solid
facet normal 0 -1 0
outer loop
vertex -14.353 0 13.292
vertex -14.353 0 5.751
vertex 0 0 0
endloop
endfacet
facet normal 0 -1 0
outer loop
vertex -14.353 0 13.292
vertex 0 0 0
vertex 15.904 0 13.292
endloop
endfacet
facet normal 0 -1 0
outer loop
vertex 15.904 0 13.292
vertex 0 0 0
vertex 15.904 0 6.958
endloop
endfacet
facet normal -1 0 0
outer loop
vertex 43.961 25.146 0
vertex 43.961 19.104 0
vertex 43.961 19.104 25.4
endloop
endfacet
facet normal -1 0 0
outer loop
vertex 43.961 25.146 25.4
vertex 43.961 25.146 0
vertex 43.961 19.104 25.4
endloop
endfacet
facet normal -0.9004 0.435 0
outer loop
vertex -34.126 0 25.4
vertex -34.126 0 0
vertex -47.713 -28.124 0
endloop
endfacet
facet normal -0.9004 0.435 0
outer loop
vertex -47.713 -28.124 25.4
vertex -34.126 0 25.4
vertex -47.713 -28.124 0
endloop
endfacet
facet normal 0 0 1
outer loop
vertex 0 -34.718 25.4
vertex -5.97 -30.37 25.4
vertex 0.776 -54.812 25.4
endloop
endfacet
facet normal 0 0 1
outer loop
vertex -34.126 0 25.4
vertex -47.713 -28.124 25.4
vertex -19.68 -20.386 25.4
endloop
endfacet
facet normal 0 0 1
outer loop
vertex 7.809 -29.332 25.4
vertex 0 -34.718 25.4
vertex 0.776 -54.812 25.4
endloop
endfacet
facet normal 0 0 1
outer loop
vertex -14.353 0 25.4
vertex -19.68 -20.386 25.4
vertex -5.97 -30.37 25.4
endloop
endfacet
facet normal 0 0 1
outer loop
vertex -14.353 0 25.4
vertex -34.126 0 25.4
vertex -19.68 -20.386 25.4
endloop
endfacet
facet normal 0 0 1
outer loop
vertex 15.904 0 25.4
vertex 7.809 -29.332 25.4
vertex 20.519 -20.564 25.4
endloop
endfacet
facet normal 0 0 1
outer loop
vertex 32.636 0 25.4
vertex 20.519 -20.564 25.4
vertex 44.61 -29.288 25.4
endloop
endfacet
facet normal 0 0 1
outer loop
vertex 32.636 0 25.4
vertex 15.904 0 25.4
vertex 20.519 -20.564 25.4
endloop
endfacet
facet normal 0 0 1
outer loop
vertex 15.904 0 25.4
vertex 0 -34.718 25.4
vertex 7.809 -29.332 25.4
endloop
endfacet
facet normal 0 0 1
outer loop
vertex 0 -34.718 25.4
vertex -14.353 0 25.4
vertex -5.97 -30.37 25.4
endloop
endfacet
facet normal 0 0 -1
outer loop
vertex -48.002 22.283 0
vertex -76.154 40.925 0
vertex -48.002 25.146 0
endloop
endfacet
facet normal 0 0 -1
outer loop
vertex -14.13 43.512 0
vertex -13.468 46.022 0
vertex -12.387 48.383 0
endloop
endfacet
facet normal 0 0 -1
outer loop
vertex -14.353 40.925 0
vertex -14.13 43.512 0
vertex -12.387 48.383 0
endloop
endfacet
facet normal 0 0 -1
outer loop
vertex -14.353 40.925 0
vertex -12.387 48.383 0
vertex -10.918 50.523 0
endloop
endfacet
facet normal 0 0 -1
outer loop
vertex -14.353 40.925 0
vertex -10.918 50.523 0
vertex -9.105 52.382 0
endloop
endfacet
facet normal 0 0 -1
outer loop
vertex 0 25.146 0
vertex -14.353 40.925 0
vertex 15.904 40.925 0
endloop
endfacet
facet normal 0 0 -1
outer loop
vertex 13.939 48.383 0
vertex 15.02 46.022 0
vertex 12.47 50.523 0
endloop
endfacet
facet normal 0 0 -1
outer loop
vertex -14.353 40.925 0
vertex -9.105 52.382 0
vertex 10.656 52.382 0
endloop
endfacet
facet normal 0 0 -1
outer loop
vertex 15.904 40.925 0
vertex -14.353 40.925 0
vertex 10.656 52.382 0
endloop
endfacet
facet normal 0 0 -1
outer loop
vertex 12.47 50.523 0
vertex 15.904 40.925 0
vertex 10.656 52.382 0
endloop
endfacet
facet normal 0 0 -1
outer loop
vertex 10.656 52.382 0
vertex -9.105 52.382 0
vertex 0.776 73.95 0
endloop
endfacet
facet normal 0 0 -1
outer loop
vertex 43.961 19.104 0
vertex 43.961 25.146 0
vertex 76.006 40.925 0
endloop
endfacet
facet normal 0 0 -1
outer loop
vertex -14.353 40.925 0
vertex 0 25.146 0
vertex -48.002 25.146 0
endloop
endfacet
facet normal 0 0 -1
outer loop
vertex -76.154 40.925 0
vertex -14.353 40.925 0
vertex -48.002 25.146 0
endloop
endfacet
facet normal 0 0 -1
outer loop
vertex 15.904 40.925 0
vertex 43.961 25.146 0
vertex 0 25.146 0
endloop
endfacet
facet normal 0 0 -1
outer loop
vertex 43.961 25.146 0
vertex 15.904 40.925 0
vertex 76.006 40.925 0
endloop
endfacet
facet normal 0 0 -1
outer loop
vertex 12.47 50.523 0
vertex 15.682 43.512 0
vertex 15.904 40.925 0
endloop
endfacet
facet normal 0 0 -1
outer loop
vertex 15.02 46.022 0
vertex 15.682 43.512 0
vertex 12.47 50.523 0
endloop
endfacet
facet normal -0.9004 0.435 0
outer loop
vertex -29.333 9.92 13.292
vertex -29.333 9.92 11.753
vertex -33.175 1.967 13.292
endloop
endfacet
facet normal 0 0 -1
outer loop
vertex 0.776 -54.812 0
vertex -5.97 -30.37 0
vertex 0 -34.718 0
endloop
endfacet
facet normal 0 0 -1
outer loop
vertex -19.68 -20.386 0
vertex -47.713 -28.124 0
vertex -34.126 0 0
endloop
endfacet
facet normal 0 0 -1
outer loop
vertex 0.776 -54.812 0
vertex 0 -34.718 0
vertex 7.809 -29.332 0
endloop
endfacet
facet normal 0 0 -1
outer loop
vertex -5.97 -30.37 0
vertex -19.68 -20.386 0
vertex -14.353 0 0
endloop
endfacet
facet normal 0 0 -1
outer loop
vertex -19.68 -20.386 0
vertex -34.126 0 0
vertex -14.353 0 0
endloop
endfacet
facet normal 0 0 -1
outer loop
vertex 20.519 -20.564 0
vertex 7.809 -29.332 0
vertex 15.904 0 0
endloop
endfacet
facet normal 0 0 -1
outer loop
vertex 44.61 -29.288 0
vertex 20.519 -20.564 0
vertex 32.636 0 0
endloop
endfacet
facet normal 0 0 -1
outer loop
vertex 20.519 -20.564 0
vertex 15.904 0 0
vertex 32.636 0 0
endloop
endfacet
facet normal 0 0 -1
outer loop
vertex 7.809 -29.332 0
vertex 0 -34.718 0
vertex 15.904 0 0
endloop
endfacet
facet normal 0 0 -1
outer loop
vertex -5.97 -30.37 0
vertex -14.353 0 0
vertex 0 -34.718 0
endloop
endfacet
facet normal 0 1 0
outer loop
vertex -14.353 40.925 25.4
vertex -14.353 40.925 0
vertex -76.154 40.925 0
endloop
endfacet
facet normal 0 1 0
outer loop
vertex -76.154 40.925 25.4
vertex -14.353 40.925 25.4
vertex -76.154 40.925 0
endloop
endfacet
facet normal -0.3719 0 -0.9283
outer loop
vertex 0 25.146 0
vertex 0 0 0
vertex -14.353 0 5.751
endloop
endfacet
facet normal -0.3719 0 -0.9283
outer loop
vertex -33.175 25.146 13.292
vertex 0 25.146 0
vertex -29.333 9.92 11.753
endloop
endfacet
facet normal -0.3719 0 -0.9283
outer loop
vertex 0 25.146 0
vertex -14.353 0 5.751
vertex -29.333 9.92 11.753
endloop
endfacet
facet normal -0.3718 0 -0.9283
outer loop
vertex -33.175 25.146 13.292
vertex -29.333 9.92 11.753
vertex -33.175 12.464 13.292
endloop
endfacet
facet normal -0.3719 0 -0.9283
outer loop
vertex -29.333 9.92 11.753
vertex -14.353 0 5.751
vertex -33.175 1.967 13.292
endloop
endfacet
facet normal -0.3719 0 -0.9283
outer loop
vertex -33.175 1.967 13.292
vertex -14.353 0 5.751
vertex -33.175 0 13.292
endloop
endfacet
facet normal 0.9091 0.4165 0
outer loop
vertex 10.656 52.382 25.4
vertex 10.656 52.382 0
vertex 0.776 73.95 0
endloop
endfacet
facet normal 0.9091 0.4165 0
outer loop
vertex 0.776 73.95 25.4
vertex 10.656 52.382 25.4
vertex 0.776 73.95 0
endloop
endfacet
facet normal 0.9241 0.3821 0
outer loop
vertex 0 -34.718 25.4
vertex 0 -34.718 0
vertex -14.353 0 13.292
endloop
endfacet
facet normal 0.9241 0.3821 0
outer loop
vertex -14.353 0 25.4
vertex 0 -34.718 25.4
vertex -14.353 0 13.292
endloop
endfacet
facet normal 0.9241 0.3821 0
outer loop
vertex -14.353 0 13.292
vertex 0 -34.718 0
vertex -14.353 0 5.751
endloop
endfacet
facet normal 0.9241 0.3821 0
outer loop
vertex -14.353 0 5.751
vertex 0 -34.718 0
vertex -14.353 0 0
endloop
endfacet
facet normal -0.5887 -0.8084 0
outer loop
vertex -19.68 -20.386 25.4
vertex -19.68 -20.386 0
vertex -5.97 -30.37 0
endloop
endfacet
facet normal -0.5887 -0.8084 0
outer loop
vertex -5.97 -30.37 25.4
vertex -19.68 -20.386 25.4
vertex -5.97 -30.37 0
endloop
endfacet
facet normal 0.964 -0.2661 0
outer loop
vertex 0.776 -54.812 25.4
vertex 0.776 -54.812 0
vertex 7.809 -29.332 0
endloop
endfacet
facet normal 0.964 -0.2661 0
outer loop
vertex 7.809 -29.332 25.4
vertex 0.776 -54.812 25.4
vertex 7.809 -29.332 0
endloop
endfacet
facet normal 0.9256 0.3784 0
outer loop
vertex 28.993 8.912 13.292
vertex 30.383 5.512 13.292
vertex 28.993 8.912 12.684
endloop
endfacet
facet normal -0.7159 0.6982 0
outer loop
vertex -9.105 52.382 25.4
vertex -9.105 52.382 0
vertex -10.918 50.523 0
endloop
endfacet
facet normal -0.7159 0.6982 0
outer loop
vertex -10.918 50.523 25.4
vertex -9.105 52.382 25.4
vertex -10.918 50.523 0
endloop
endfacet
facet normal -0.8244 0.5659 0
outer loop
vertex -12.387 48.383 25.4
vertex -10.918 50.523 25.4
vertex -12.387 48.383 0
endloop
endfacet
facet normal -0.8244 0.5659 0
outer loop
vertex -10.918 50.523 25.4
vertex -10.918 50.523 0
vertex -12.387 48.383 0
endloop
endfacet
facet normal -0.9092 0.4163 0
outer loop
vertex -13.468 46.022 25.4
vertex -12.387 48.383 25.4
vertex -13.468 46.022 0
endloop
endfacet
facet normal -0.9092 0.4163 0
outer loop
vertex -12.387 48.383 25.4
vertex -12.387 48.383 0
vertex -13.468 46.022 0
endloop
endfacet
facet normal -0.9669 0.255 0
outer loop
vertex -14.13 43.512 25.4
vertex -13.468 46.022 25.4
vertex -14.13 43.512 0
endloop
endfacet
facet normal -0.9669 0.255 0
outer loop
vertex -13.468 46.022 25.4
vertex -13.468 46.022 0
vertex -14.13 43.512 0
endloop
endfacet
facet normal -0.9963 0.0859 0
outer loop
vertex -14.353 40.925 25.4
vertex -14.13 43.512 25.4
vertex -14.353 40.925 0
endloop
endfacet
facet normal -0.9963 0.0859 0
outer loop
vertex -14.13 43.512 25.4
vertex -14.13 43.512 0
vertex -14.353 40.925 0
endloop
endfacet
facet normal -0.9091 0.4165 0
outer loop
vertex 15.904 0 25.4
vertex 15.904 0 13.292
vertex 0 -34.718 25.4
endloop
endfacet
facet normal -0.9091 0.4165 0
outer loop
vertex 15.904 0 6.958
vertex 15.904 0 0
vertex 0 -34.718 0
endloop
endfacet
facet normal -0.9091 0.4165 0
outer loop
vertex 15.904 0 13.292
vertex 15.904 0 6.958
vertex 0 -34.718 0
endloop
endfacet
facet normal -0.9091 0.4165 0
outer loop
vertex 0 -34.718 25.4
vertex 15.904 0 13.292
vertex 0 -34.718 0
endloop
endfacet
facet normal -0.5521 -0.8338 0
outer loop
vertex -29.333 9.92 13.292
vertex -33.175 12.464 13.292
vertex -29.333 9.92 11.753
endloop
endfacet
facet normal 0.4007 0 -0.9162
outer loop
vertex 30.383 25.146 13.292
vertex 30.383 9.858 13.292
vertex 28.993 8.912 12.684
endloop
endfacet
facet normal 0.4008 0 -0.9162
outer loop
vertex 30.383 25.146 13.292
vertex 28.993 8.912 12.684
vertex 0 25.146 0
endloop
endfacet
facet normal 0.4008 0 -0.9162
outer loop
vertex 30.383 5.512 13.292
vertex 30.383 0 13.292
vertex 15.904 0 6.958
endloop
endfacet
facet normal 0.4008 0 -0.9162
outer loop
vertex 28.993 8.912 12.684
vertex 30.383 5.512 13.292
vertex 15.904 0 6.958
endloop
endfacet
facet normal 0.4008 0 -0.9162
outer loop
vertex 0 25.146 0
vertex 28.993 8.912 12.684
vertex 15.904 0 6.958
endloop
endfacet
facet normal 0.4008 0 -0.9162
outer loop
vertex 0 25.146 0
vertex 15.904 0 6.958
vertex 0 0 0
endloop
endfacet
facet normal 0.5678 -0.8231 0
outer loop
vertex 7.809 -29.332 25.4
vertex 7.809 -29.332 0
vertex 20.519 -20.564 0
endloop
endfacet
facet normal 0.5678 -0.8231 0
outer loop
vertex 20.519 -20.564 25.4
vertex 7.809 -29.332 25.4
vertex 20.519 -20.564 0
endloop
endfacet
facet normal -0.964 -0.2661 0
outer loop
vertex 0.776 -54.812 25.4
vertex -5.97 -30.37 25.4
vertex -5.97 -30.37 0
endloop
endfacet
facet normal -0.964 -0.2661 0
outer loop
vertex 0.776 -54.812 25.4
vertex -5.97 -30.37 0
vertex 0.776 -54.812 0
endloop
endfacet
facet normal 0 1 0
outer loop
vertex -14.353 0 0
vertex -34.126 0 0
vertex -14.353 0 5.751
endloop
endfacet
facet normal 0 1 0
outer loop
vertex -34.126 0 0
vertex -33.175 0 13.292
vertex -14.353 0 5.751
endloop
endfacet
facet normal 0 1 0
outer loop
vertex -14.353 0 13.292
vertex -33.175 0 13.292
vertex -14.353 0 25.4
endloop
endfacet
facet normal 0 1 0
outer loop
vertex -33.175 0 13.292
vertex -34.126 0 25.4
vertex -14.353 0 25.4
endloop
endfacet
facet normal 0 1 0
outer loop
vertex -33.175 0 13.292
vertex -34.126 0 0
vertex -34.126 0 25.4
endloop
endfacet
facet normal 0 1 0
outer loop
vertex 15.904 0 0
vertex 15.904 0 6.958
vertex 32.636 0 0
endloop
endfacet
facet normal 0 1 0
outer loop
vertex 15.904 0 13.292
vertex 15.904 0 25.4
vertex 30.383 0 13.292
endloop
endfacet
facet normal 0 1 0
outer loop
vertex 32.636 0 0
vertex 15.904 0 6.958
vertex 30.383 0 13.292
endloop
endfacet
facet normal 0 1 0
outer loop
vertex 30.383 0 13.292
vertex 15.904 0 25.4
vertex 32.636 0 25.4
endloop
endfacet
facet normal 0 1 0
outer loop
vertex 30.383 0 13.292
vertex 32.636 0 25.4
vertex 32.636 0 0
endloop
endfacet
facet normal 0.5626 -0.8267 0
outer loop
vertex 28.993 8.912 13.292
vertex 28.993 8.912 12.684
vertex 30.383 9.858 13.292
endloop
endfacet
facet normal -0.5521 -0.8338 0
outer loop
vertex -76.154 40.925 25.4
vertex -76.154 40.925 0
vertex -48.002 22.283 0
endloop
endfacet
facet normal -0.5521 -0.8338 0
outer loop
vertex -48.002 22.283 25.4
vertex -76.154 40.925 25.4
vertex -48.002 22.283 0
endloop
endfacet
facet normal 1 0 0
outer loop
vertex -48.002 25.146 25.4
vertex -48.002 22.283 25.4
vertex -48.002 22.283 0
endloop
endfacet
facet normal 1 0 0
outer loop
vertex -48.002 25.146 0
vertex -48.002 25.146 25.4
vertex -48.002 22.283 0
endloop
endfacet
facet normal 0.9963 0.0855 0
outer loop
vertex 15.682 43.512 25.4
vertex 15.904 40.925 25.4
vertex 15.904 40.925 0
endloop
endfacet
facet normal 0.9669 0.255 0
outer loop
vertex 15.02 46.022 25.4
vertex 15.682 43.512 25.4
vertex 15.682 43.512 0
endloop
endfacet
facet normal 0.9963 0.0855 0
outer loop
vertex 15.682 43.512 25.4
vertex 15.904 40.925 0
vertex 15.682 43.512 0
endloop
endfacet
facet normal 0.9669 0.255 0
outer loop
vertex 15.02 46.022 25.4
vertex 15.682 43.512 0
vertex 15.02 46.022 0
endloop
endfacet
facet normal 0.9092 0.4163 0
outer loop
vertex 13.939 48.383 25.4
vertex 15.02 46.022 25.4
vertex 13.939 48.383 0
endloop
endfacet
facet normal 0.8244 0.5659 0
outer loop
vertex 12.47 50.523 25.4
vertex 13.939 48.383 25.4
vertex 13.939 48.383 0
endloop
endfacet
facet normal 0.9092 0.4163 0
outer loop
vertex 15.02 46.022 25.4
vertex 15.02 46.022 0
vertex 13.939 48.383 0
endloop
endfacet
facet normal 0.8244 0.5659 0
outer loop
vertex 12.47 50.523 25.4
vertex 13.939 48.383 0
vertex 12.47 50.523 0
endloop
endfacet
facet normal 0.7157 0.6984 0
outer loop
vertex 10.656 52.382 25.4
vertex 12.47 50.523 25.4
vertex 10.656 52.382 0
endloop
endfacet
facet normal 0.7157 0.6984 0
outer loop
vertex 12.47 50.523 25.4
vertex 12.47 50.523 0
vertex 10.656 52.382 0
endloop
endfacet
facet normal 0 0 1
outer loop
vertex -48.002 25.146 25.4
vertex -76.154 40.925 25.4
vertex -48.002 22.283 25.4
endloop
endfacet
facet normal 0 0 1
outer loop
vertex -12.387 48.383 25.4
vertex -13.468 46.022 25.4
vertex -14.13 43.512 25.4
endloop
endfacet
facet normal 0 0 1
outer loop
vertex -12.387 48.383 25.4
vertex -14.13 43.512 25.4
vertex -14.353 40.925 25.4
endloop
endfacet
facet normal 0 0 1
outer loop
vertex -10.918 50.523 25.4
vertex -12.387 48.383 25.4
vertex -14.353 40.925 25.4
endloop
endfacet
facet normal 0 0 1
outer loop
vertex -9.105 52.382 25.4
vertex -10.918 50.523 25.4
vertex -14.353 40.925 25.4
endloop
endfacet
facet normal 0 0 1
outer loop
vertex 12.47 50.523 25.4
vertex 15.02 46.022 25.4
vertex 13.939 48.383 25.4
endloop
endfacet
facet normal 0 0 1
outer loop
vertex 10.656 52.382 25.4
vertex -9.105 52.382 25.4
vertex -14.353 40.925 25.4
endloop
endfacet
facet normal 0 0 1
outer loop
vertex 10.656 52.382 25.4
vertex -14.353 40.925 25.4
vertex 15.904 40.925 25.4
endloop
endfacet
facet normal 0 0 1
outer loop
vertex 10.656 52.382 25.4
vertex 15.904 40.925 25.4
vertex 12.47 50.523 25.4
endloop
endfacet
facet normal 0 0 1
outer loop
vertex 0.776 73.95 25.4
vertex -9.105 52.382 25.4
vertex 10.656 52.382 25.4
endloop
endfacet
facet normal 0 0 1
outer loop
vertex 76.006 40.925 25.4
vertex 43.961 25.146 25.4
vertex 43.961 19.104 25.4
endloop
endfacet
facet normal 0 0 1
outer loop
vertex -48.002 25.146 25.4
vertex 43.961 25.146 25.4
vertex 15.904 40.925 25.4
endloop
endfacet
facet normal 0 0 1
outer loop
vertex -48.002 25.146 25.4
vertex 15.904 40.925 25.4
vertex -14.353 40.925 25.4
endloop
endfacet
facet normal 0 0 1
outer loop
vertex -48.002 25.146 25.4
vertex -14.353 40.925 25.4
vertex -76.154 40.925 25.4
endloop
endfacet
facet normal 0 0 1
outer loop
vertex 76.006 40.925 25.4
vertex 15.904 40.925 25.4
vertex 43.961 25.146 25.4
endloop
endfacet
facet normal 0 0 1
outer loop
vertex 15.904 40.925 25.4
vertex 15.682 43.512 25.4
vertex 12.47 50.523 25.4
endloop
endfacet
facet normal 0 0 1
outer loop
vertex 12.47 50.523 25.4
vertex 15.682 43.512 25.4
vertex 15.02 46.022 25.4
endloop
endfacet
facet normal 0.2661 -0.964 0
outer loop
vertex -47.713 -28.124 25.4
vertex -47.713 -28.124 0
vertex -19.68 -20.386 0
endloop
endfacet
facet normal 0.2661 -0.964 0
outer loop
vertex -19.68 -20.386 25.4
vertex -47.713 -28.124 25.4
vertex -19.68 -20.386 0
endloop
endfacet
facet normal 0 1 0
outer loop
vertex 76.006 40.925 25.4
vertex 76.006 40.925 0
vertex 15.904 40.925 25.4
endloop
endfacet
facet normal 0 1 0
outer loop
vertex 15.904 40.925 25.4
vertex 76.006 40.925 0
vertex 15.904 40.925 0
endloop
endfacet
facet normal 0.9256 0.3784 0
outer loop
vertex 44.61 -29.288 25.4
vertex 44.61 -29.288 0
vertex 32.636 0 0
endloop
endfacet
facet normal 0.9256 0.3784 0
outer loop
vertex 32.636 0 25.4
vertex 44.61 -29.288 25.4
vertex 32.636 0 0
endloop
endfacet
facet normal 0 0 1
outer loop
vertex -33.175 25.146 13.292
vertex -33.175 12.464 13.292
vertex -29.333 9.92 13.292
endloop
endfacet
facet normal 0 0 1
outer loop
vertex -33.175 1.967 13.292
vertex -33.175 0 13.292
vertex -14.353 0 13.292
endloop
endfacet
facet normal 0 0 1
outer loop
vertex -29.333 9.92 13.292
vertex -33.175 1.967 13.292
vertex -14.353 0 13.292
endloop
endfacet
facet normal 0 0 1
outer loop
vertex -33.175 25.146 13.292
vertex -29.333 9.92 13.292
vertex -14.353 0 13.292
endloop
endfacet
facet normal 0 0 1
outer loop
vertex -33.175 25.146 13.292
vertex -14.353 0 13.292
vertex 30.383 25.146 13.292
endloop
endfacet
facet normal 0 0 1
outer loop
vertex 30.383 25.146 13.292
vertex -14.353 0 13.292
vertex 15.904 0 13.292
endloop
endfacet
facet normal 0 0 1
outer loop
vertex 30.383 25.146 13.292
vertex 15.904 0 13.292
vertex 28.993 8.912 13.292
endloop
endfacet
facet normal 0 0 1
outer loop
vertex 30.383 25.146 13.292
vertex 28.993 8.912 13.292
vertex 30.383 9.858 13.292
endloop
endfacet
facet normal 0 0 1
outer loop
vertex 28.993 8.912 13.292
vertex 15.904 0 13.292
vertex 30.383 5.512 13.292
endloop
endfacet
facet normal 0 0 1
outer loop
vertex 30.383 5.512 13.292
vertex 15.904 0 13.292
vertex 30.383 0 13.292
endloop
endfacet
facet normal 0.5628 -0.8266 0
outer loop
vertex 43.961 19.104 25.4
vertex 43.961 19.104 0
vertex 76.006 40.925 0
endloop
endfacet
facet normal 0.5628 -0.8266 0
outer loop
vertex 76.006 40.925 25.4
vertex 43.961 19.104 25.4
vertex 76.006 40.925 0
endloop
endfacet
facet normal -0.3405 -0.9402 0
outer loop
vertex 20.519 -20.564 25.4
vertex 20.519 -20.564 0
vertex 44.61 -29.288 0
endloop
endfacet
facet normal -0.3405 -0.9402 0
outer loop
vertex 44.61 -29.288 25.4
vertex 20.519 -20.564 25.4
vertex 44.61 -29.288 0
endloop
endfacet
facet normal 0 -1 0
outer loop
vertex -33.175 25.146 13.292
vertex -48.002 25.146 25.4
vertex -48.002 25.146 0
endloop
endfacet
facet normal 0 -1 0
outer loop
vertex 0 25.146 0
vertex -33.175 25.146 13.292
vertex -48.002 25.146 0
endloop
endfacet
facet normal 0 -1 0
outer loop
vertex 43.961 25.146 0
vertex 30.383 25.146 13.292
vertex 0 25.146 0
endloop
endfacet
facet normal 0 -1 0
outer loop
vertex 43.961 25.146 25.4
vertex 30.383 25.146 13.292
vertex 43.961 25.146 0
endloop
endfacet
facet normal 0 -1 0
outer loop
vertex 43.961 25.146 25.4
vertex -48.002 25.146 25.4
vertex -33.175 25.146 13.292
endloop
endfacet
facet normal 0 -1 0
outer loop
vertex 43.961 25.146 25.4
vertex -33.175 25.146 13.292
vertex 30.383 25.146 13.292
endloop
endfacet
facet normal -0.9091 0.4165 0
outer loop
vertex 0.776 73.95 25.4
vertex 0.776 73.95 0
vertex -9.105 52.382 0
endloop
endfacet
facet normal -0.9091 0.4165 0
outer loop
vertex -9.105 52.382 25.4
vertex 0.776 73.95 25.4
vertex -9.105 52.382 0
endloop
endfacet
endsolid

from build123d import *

# Parameters (mm, degrees)
F0_W     = 14.3528226763
F0_H     = 40.9249328077
F0_W_2   = 15.9044768661
F1_DEPTH = 25.4
F3_DEPTH = 36.322
F5_DEPTH = 25.146


with BuildPart() as f1:
    # F0 (on Top) → F1 (new body)
    with BuildSketch(Plane.XY):
        with Locations((-7.1764113382, 20.4624664038)):
            Rectangle(F0_W, F0_H)
        with Locations((7.9522384331, 20.4624664038)):
            Rectangle(F0_W_2, F0_H)
        Polygon((-29.3328283983, 9.9198052494), (-14.3528226763, 0), (-14.3528226763, 40.9249328077), align=None)
        Polygon((-5.9702647759, -30.3703169913), (-14.3528226763, 0), (-47.713432461, -28.1237699091), (-19.6796488017, -20.3861221671), align=None)
        Polygon((-47.713432461, -28.1237699091), (-14.3528226763, 0), (-29.3328283983, 9.9198052494), align=None)
        Polygon((0, -34.7183085978), (-14.3528226763, 0), (-5.9702647759, -30.3703169913), align=None)
        with BuildLine():
            Line((-14.3528226763, 40.9249328077), (0, 40.9249328077))
            Line((0, 40.9249328077), (15.9044768661, 40.9249328077))
            Line((15.9044768661, 40.9249328077), (10.6561835989, 52.3815727712))
            ThreePointArc((10.6561835989, 52.3815727712), (0.7758270949, 56.0535825789), (-9.1045294091, 52.3815727712))
            Line((-9.1045294091, 52.3815727712), (-14.3528226763, 40.9249328077))
        make_face()
        Polygon((28.9926118268, 8.9120575126), (15.9044768661, 0), (44.6101129055, -29.2875114828), align=None)
        Polygon((7.8085155122, -29.3319671142), (15.9044768661, 0), (0, -34.7183085978), align=None)
        Polygon((15.9044768661, 40.9249328077), (15.9044768661, 0), (28.9926118268, 8.9120575126), align=None)
        Polygon((44.6101129055, -29.2875114828), (15.9044768661, 0), (7.8085155122, -29.3319671142), (20.5186381936, -20.5644797534), align=None)
        Polygon((-29.3328283983, 9.9198052494), (-14.3528226763, 40.9249328077), (-76.1540085077, 40.9249328077), align=None)
        with BuildLine():
            ThreePointArc((-9.1045294091, 52.3815727712), (-12.9783085934, 47.2257101699), (-14.3528226763, 40.9249328077))
            Line((-14.3528226763, 40.9249328077), (-9.1045294091, 52.3815727712))
        make_face()
        Polygon((7.8085155122, -29.3319671142), (0, -34.7183085978), (-5.9702647759, -30.3703169913), (0.7758270949, -54.8116570932), align=None)
        Polygon((76.0063156486, 40.9249328077), (15.9044768661, 40.9249328077), (28.9926118268, 8.9120575126), align=None)
        with BuildLine():
            Line((10.6561835989, 52.3815727712), (15.9044768661, 40.9249328077))
            ThreePointArc((15.9044768661, 40.9249328077), (14.5299627832, 47.2257101699), (10.6561835989, 52.3815727712))
        make_face()
        with BuildLine():
            Line((0.7758270949, 73.9496676573), (-9.1045294091, 52.3815727712))
            ThreePointArc((-9.1045294091, 52.3815727712), (0.7758270949, 56.0535825789), (10.6561835989, 52.3815727712))
            Line((10.6561835989, 52.3815727712), (0.7758270949, 73.9496676573))
        make_face()
    extrude(amount=F1_DEPTH)

    # F2 (on Top) → F3 (cut)
    with BuildSketch(Plane.XY):
        Polygon((0, 17.6911037415), (0, 0), (26.803391082, 17.6601352598), align=None)
        Polygon((-27.6542542717, 17.7230553056), (0, 0), (0, 17.6911037415), align=None)
        Polygon((-44.7053313255, 28.6507476121), (-27.6542542717, 17.7230553056), (0, 17.6911037415), align=None)
        Polygon((0, 17.6911037415), (26.803391082, 17.6601352598), (43.3298423886, 28.5490322858), align=None)
        Polygon((-44.7053313255, 28.6507476121), (0, 17.6911037415), (43.3298423886, 28.5490322858), align=None)
    extrude(amount=-F3_DEPTH, mode=Mode.SUBTRACT)

    # F4 (on Front) → F5 (cut)
    with BuildSketch(Plane.XZ):
        with BuildLine():
            Line((43.9610369503, 0), (0, 0))
            Line((0, 0), (-48.0021461844, 0))
            ThreePointArc((-48.0021461844, 0), (-2.020554617, -23.4103047443), (43.9610369503, 0))
        make_face()
        Polygon((30.382517891, 13.2921541349), (0, 0), (43.9610369503, 0), (43.9610369503, 19.2326679826), align=None)
        Polygon((-48.0021461844, 0), (0, 0), (-33.1754245675, 13.2921541349), (-48.0021461844, 19.2326679826), align=None)
        Polygon((-48.0021461844, 19.2326679826), (-33.1754245675, 13.2921541349), (0, 13.2921541349), (0, 36.8990898132), align=None)
        Polygon((0, 13.2921541349), (30.382517891, 13.2921541349), (43.9610369503, 19.2326679826), (0, 36.8990898132), align=None)
        Polygon((-48.0021461844, 56.3966855407), (-48.0021461844, 19.2326679826), (0, 36.8990898132), (43.9610369503, 19.2326679826), (43.9610369503, 56.5599761903), (0, 56.3966855407), align=None)
    extrude(amount=-F5_DEPTH, mode=Mode.SUBTRACT)


solid = f1.part
